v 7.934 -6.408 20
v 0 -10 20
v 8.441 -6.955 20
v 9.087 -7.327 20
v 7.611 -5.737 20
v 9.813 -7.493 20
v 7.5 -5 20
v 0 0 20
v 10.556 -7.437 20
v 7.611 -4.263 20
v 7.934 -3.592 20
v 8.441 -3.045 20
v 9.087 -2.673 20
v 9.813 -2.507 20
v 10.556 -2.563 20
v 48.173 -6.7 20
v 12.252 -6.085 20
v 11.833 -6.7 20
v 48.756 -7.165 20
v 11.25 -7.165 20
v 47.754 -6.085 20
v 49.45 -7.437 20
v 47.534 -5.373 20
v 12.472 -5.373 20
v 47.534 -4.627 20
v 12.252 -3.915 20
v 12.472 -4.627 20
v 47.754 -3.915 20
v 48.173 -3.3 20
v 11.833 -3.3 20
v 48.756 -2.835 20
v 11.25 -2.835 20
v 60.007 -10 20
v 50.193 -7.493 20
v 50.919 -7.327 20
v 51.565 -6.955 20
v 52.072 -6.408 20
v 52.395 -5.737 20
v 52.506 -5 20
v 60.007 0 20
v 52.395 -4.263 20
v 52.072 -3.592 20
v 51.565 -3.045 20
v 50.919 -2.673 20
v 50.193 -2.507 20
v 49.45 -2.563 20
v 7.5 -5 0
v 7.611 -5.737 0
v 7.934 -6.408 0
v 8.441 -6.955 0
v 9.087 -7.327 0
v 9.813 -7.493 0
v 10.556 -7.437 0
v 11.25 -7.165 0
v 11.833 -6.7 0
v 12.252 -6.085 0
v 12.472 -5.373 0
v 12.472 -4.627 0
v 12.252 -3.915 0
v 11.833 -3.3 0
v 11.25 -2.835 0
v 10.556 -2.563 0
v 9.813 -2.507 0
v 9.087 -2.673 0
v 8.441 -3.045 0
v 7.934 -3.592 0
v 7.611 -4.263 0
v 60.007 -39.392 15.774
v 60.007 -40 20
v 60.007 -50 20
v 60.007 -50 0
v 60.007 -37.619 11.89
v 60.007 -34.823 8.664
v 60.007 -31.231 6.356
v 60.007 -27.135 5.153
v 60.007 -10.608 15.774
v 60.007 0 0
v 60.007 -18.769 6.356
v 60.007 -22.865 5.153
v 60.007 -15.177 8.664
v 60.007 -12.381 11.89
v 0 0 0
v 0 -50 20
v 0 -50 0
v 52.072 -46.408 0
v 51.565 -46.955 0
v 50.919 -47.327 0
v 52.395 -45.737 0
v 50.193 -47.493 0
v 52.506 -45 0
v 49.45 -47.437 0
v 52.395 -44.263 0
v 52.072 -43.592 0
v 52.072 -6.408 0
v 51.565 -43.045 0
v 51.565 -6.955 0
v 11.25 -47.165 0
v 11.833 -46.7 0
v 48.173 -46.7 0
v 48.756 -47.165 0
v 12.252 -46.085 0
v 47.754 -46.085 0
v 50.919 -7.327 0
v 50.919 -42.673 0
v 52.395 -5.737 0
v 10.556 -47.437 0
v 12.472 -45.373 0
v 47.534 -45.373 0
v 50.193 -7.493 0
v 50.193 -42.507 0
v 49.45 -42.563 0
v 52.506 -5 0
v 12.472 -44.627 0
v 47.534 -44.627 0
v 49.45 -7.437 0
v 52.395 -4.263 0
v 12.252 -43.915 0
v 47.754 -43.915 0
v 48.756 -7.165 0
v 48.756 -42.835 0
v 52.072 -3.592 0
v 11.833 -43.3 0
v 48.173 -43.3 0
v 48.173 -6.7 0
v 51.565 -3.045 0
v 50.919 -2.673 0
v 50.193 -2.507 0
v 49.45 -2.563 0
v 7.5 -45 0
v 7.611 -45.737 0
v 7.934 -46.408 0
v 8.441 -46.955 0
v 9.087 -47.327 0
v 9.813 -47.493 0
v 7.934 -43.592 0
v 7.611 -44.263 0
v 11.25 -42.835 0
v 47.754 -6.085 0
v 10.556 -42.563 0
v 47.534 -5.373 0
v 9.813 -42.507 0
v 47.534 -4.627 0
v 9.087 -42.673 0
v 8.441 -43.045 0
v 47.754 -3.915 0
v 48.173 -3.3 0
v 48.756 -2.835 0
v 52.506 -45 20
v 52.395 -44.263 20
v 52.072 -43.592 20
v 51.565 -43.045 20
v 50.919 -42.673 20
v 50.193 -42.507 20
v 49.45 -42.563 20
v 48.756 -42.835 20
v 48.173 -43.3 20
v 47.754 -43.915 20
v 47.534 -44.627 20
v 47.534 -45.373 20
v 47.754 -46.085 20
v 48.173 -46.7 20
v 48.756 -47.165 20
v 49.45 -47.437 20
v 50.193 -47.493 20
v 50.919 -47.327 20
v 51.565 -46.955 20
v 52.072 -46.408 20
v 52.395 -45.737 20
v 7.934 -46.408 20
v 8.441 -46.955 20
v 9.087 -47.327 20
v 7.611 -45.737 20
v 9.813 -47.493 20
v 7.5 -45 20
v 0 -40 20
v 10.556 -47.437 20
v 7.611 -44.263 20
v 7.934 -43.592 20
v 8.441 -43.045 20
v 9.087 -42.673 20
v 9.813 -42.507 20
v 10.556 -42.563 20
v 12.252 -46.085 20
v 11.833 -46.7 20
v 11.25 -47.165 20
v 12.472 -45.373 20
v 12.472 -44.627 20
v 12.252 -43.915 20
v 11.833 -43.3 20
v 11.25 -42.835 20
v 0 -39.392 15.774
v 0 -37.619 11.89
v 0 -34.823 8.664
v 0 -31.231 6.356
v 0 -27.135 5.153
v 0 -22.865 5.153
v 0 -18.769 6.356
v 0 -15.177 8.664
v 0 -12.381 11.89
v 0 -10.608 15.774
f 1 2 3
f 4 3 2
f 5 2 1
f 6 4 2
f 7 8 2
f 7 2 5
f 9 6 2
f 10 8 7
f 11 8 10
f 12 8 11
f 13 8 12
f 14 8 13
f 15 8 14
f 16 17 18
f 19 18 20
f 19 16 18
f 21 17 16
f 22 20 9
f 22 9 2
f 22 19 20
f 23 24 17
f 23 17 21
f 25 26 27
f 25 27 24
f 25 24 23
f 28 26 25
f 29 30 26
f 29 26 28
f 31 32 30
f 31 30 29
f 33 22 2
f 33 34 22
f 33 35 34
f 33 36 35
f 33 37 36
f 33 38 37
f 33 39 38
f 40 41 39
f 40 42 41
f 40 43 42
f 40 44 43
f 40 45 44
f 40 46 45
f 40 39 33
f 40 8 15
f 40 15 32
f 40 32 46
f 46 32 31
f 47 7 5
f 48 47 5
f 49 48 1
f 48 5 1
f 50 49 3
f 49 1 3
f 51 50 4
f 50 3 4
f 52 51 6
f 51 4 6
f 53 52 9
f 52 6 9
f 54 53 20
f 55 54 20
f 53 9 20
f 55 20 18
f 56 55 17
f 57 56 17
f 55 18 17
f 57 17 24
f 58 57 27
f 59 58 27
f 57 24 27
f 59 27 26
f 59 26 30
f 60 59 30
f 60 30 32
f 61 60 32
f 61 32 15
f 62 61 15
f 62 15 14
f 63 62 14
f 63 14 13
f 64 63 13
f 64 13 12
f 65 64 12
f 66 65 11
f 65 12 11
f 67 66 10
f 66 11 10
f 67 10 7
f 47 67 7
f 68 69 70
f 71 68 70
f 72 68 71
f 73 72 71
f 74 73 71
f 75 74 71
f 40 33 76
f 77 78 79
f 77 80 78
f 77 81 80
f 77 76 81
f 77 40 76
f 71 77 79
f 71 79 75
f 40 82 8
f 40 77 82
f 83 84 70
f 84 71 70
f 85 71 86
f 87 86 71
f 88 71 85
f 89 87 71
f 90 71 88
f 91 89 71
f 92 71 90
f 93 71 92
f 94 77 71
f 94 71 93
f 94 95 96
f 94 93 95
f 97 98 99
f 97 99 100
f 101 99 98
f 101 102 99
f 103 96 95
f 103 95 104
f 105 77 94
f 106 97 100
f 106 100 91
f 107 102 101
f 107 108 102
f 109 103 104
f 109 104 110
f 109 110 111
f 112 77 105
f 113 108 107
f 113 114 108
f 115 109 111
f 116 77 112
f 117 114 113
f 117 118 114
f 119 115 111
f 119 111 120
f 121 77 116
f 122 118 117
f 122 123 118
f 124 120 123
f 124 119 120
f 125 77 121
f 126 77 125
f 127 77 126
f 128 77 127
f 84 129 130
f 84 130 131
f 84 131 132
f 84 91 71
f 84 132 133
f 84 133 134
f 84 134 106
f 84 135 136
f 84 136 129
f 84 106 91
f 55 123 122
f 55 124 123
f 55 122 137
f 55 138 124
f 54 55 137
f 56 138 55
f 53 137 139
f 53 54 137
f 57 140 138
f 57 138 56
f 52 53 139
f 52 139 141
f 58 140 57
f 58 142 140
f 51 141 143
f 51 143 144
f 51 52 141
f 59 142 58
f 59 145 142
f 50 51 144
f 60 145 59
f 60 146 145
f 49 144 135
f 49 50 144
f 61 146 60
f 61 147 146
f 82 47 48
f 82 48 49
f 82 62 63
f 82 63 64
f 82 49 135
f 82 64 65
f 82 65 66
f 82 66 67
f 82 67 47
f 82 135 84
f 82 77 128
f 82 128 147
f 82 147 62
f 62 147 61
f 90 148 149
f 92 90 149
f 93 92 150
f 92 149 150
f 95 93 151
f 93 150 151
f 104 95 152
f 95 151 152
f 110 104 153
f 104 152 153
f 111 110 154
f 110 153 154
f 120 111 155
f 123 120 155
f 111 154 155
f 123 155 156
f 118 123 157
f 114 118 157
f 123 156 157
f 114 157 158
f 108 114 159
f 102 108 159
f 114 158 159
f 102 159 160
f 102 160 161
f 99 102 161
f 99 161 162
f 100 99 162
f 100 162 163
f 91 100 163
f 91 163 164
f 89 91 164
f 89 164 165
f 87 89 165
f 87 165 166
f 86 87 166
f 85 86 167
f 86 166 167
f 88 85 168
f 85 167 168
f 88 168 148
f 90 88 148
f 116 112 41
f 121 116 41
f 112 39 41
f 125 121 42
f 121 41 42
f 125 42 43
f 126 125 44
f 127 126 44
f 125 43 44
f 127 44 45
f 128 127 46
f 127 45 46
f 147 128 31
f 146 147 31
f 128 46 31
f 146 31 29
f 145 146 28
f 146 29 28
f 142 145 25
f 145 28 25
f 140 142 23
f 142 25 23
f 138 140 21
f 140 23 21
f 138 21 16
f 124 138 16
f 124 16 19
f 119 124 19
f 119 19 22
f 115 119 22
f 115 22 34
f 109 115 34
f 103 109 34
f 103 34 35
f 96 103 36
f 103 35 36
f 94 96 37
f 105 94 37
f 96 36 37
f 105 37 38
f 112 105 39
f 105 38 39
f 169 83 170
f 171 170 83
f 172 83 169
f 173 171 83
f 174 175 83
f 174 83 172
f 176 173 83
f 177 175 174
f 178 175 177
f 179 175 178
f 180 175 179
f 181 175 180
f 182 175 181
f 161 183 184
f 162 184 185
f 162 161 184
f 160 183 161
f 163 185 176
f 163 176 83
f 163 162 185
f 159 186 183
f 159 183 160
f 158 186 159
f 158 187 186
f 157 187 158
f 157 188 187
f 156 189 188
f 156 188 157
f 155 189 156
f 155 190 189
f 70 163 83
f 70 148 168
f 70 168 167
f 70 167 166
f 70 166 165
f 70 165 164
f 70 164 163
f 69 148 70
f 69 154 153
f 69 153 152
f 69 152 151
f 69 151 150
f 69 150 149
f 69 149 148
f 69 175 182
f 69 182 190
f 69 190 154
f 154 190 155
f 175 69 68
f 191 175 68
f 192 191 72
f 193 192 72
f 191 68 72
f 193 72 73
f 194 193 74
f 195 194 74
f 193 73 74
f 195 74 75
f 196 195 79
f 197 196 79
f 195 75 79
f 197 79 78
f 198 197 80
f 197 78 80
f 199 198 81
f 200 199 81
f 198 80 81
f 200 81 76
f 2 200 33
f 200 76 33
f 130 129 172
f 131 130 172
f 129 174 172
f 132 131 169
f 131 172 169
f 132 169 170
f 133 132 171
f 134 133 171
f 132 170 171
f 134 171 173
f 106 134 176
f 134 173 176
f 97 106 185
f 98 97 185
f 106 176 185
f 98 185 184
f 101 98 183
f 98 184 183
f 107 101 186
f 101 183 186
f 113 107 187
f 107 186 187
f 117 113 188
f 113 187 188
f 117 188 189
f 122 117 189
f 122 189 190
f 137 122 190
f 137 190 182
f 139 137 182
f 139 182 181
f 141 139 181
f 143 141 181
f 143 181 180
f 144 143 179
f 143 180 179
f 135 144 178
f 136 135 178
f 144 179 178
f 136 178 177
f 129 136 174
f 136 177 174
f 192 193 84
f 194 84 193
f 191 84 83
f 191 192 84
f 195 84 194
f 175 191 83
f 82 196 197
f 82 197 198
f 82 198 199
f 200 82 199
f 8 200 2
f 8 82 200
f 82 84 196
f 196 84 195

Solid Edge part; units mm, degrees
sketch "Sketch1" plane through (0, 0, 0) normal (0, -1, 0) x (1, 0, 0)
  line L0 (60.007, 20) -> (60.007, 0)
  line L1 (60.007, 0) -> (0, 0)
  line L2 (0, 0) -> (0, 20)
  line L3 (0, 20) -> (60.007, 20)
extrude "Protrusion1" add sketch "Sketch1" along normal blind 50
sketch "Sketch2" plane through (60.007, -20, 10) normal (1, 0, 0) x (0, 1, 0)
  circle A0 centre (-5, 10) radius 15
extrude "ExtrudedCutout_1" cut sketch "Sketch2" against normal blind 100
sketch "Sketch3" plane through (30.0035, -45, 20) normal (0, 0, 1) x (-1, 0, 0)
  circle A0 centre (20.0035, 0) radius 2.5
extrude "Cutout1" cut sketch "Sketch3" against normal blind 100
mirror "Mirror1" about plane through (30.003, -25, 10) normal (-1, 0, 0) of "Cutout1"
mirror "Mirror2" about plane through (30.0035, -25, 10) normal (0, 1, 0) of "Cutout1", "Mirror1"
